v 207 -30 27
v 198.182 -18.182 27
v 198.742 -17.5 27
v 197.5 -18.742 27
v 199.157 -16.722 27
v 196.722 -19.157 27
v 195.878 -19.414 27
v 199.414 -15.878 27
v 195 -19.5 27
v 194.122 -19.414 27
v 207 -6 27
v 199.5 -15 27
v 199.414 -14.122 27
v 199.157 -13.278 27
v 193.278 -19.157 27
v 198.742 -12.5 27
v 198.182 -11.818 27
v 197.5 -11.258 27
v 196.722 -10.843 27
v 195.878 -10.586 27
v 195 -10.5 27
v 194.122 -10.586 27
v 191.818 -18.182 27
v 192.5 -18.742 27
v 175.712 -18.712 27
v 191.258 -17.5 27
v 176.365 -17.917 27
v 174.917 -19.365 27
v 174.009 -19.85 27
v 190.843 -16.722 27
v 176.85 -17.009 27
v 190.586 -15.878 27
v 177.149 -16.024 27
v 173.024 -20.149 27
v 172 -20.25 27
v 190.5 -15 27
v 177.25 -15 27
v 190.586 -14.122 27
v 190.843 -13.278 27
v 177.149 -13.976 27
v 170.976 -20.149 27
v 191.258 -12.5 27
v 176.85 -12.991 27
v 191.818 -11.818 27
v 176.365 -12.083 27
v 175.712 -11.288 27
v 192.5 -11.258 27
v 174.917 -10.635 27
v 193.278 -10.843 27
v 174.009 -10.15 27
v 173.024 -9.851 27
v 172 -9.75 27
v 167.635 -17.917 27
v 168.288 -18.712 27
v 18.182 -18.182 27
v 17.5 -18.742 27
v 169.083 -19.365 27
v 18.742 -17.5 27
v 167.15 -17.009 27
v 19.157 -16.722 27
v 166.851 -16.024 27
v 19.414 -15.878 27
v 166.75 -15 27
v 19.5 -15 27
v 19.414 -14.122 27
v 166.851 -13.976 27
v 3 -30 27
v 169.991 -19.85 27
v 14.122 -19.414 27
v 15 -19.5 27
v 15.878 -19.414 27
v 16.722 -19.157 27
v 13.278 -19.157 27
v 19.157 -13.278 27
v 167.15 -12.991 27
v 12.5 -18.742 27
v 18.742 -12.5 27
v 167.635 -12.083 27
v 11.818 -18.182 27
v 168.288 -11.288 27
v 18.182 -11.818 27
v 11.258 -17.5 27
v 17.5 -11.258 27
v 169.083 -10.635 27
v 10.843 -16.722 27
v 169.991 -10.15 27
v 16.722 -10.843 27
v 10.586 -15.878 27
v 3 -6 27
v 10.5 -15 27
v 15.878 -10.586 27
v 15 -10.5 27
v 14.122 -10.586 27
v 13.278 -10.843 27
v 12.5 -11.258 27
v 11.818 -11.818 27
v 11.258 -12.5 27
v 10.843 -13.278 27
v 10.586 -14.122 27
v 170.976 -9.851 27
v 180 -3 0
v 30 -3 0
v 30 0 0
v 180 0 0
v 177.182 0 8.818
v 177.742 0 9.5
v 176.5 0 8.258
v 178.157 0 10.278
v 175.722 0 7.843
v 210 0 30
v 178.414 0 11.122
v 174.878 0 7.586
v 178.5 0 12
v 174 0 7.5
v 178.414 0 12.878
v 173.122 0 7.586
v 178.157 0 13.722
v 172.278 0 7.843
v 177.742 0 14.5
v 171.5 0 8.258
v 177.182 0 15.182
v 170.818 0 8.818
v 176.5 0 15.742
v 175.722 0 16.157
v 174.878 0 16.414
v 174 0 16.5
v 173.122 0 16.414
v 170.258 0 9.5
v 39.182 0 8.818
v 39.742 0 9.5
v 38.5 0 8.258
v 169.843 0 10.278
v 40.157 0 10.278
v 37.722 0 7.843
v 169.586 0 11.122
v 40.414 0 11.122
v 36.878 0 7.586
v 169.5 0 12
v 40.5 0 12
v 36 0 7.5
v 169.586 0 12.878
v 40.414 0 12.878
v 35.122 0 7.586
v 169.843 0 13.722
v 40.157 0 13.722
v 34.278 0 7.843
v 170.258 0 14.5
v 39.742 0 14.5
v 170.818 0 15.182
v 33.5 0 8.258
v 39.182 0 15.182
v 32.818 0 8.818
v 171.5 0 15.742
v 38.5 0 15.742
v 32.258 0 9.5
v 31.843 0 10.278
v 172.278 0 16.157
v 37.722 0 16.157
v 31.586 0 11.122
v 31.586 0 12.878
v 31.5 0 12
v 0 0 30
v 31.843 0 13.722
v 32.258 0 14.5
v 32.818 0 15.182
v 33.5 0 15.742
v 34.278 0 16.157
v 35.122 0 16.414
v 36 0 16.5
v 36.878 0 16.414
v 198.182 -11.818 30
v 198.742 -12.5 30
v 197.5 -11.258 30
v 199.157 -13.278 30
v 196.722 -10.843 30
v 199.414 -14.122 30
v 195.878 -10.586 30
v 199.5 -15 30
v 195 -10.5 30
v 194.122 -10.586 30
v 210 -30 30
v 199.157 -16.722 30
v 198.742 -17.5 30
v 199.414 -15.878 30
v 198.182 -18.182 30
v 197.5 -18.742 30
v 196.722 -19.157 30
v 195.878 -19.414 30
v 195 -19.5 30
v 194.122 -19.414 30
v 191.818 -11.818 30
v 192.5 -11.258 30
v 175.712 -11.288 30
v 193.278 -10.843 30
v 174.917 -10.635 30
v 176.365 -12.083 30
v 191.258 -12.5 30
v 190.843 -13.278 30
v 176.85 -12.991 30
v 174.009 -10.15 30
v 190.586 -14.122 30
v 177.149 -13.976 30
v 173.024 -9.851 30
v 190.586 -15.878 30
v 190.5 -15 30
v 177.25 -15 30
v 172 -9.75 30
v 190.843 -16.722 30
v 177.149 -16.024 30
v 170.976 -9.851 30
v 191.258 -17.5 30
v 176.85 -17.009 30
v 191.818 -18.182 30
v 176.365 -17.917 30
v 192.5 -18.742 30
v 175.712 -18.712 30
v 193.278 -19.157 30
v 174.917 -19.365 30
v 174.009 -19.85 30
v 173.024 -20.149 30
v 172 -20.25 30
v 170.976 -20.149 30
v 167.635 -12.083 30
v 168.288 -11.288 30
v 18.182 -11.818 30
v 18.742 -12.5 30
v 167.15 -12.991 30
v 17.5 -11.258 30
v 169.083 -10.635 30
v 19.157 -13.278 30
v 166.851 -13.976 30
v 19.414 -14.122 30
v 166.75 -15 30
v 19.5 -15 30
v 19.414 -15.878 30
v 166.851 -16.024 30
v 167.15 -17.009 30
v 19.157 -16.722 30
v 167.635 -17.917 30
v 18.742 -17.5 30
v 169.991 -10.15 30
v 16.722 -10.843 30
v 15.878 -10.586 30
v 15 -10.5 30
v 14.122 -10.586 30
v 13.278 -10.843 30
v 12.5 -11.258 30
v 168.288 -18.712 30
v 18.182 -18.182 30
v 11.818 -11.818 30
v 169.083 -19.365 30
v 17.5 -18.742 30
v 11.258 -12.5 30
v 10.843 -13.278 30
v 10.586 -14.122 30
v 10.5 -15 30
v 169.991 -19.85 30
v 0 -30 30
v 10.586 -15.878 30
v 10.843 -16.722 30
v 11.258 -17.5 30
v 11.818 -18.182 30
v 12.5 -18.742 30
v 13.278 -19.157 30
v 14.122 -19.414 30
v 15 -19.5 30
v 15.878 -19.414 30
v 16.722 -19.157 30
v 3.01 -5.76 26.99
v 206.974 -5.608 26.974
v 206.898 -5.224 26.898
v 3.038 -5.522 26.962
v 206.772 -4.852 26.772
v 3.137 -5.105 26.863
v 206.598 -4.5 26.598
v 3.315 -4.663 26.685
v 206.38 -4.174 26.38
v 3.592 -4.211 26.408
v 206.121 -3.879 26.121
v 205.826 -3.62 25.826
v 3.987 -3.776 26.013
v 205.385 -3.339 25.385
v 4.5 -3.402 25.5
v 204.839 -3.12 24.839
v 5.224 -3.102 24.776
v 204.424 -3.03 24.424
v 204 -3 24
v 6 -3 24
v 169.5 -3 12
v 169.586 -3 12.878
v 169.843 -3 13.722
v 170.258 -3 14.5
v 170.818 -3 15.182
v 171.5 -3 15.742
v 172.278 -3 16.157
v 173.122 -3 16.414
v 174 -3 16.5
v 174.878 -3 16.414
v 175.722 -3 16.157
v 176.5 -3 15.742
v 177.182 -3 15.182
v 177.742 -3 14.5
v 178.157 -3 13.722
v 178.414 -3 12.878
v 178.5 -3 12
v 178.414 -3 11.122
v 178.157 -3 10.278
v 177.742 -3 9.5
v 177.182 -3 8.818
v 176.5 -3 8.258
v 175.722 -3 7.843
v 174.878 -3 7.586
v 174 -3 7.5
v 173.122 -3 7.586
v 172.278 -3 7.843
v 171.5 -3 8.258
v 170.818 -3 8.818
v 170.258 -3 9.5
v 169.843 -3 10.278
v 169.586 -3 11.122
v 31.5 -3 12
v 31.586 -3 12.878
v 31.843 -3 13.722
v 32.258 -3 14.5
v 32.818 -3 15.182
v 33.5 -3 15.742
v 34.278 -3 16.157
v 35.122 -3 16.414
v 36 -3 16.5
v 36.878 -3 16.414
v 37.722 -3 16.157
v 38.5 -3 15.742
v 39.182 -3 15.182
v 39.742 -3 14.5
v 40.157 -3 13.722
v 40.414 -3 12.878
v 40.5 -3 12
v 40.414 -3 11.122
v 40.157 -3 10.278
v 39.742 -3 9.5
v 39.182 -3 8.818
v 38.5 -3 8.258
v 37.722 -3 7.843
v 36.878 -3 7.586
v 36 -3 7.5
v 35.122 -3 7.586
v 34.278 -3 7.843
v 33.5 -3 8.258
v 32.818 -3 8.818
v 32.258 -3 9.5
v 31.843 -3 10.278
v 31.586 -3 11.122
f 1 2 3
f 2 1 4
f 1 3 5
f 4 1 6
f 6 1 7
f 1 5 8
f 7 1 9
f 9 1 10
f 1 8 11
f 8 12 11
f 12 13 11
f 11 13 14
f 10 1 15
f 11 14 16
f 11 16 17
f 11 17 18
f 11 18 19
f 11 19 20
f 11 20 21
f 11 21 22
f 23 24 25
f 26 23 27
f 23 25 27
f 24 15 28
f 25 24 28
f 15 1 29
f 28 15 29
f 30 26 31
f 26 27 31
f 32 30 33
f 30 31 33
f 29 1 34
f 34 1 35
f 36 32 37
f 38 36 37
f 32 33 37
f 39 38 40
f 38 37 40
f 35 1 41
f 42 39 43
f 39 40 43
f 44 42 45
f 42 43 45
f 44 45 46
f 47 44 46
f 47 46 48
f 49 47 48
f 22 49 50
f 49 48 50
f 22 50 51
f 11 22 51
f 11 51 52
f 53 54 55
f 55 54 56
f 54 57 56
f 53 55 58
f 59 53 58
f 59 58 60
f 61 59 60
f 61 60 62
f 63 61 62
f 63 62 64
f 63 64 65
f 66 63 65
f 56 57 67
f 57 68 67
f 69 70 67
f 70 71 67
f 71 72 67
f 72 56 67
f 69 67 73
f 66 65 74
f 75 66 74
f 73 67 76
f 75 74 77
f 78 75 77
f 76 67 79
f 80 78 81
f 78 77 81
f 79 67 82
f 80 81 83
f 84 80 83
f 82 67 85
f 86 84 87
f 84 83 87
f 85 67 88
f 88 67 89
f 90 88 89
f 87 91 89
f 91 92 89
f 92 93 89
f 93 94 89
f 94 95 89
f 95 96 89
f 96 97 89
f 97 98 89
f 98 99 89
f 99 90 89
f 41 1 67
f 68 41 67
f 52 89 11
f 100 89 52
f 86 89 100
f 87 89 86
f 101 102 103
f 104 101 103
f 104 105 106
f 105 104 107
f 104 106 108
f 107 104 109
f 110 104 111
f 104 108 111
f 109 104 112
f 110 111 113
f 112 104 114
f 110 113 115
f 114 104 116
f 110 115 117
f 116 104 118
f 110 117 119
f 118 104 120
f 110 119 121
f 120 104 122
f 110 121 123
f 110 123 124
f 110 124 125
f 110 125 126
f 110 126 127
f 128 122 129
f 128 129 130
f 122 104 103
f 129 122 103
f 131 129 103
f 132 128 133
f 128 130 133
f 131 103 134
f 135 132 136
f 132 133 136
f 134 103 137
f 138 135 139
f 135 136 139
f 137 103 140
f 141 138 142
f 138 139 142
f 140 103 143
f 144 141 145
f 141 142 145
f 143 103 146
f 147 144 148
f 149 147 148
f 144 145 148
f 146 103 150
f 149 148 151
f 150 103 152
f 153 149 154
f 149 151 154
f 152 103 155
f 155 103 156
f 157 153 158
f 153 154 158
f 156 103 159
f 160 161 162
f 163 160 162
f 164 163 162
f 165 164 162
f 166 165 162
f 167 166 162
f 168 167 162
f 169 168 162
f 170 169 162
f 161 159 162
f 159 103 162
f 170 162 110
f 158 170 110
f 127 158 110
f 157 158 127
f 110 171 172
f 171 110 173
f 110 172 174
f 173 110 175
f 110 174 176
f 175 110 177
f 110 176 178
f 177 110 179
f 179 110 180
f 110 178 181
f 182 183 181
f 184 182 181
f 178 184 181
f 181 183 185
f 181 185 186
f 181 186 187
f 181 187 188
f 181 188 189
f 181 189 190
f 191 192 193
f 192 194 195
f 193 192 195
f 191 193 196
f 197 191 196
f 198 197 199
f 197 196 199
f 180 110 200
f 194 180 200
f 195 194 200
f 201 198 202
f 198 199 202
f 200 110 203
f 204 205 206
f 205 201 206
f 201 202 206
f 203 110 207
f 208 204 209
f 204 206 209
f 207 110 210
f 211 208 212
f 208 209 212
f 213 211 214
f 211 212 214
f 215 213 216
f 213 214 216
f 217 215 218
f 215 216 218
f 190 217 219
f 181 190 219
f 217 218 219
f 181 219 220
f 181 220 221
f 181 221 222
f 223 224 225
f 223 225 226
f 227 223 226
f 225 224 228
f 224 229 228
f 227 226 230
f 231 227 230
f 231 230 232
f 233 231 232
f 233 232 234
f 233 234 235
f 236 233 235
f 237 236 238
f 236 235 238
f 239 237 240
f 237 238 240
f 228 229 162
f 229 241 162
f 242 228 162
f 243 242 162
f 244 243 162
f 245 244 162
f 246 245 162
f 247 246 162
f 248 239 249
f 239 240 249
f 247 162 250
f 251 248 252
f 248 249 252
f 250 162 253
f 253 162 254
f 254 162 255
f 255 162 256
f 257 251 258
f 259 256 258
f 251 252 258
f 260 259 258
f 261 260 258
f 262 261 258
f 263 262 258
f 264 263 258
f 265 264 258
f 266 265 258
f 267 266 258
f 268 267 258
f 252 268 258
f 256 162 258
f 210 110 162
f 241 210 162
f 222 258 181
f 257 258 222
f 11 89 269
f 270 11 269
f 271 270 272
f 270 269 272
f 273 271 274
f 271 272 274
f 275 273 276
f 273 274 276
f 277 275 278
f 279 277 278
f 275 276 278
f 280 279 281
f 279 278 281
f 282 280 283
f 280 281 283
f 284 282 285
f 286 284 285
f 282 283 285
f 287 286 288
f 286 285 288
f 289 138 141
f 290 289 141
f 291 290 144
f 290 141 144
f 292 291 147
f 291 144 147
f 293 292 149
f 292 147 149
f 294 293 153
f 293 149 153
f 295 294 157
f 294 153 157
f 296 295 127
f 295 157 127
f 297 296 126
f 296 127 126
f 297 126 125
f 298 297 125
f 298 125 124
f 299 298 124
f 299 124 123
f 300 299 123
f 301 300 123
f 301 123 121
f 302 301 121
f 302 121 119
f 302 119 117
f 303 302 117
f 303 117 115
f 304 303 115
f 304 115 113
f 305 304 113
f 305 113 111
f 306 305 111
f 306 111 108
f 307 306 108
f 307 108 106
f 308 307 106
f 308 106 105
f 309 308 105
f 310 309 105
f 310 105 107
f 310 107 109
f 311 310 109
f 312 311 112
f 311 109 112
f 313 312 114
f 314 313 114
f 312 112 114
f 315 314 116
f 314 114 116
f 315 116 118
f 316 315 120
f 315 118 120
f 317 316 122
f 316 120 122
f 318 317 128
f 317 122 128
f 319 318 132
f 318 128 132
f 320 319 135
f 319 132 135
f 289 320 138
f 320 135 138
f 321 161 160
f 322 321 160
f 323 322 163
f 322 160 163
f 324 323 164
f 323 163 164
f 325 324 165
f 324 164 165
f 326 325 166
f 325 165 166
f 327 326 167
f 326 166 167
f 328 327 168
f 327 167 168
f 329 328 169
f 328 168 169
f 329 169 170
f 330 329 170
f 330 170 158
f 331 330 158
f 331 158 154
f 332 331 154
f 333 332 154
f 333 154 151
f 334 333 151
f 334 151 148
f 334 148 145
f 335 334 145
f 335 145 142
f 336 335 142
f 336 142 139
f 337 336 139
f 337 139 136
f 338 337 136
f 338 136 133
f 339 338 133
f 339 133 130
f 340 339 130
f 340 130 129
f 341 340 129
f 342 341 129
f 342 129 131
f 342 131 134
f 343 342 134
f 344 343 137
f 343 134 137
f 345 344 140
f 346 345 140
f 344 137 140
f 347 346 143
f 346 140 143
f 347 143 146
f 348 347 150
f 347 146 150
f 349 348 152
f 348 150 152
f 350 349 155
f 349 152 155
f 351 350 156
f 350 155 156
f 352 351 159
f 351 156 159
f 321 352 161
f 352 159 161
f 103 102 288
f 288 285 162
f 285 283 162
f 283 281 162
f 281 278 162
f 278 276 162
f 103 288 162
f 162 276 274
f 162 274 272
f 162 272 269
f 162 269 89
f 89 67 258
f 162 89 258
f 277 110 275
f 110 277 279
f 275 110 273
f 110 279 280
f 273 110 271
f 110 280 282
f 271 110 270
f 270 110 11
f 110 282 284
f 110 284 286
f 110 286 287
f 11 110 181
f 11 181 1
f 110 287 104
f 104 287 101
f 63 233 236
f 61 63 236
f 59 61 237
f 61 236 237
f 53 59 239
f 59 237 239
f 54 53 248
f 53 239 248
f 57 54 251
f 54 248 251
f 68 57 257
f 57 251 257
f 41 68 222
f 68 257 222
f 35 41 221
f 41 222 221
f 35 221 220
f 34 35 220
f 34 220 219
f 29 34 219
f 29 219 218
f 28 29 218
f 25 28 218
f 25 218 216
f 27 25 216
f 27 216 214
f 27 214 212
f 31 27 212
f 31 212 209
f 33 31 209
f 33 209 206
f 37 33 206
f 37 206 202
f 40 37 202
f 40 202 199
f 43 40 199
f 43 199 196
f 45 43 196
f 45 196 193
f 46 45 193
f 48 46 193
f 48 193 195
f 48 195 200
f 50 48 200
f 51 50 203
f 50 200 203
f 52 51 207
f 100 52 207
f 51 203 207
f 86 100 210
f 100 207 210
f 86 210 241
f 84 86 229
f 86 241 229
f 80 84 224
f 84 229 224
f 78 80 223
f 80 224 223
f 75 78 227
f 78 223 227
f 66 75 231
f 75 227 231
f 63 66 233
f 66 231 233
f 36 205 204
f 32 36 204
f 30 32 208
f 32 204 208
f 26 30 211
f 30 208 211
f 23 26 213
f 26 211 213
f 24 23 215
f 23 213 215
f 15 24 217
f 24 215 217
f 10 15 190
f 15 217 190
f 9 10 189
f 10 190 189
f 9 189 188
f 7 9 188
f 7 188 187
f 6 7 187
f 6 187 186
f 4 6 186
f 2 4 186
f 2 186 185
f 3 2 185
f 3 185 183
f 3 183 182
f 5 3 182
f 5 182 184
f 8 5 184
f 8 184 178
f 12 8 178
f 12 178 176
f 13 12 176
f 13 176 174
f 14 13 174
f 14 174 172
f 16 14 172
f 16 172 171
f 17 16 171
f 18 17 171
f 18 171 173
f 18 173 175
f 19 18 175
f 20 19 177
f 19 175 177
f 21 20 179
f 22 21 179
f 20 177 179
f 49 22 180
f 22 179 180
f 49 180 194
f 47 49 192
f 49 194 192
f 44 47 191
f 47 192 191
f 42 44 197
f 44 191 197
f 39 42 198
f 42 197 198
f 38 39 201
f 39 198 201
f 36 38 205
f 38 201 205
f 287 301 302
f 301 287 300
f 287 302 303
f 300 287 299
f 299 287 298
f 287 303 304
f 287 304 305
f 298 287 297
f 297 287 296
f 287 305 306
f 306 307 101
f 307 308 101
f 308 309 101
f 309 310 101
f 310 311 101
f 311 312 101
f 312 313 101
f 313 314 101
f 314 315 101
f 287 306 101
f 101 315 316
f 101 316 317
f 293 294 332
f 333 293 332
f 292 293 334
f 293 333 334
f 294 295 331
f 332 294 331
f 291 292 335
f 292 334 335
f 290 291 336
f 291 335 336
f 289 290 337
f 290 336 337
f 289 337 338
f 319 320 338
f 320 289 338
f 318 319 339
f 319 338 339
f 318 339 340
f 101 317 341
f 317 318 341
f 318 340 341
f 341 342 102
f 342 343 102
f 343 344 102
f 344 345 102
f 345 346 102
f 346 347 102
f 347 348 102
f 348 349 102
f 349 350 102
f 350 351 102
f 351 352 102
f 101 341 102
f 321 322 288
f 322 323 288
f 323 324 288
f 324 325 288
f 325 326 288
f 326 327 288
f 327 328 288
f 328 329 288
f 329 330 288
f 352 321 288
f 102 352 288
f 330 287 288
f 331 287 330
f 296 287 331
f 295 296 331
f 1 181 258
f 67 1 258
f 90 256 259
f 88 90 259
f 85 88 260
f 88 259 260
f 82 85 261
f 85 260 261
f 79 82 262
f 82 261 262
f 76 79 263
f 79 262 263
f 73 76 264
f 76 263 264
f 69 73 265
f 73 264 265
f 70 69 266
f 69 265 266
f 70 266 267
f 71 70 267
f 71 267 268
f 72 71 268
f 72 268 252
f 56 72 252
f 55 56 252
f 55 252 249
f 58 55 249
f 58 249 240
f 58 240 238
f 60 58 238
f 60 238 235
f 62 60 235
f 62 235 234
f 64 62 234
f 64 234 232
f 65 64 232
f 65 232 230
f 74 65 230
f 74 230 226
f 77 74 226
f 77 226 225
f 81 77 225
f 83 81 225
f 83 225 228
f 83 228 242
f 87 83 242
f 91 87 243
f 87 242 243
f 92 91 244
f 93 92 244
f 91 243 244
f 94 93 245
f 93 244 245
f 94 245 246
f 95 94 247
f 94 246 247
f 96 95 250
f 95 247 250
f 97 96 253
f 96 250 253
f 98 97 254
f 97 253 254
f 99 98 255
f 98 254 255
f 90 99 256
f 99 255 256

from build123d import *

# Parameters (mm, degrees)
F1_DEPTH = 210
F3_D     = 9
F3_DEPTH = 12
F3_TIP   = 2.7038727856
F5_DEPTH = 95
F7_D     = 9
F7_DEPTH = 12
F7_TIP   = 2.7038727856
F9_D     = 10.5
F9_DEPTH = 12
F9_TIP   = 3.1545182499


with BuildPart() as f1:
    # F0 (on Right) → F1 (new body)
    with BuildSketch(Plane.YZ):
        with BuildLine():
            Line((-3, 0), (0, 0))
            Line((0, 0), (0, 30))
            Line((0, 30), (-30, 30))
            Line((-30, 30), (-30, 27))
            Line((-30, 27), (-6, 27))
            ThreePointArc((-6, 27), (-3.8786796564, 26.1213203436), (-3, 24))
            Line((-3, 24), (-3, 0))
        make_face()
    extrude(amount=F1_DEPTH)

    # F3
    with Locations(Plane.XZ.offset(3)):
        with Locations((36, 12), (174, 12)):
            Hole(F3_D / 2, depth=F3_DEPTH)
            with Locations((0, 0, -(F3_DEPTH + F3_TIP / 2))):  # 118° drill point
                Cone(0, F3_D / 2, F3_TIP, mode=Mode.SUBTRACT)

    # F4 (on face) → F5 (cut)
    with BuildSketch(Plane.XZ.offset(30)):
        Polygon((30, 0), (3, 27), (0, 27), (0, 0), align=None)
        Polygon((3, 27), (0, 30), (0, 27), align=None)
        Polygon((210, 27), (210, 30), (207, 27), align=None)
        Polygon((210, 27), (207, 27), (180, 0), (210, 0), align=None)
    extrude(amount=-F5_DEPTH, mode=Mode.SUBTRACT)

    # F7
    with Locations(Plane(origin=(0, 0, 27), x_dir=(1, 0, 0), z_dir=(0, 0, -1))):
        with Locations((15, 15), (195, 15)):
            Hole(F7_D / 2, depth=F7_DEPTH)
            with Locations((0, 0, -(F7_DEPTH + F7_TIP / 2))):  # 118° drill point
                Cone(0, F7_D / 2, F7_TIP, mode=Mode.SUBTRACT)

    # F9
    with Locations(Plane(origin=(0, 0, 27), x_dir=(1, 0, 0), z_dir=(0, 0, -1))):
        with Locations((172, 15)):
            Hole(F9_D / 2, depth=F9_DEPTH)
            with Locations((0, 0, -(F9_DEPTH + F9_TIP / 2))):  # 118° drill point
                Cone(0, F9_D / 2, F9_TIP, mode=Mode.SUBTRACT)


solid = f1.part
